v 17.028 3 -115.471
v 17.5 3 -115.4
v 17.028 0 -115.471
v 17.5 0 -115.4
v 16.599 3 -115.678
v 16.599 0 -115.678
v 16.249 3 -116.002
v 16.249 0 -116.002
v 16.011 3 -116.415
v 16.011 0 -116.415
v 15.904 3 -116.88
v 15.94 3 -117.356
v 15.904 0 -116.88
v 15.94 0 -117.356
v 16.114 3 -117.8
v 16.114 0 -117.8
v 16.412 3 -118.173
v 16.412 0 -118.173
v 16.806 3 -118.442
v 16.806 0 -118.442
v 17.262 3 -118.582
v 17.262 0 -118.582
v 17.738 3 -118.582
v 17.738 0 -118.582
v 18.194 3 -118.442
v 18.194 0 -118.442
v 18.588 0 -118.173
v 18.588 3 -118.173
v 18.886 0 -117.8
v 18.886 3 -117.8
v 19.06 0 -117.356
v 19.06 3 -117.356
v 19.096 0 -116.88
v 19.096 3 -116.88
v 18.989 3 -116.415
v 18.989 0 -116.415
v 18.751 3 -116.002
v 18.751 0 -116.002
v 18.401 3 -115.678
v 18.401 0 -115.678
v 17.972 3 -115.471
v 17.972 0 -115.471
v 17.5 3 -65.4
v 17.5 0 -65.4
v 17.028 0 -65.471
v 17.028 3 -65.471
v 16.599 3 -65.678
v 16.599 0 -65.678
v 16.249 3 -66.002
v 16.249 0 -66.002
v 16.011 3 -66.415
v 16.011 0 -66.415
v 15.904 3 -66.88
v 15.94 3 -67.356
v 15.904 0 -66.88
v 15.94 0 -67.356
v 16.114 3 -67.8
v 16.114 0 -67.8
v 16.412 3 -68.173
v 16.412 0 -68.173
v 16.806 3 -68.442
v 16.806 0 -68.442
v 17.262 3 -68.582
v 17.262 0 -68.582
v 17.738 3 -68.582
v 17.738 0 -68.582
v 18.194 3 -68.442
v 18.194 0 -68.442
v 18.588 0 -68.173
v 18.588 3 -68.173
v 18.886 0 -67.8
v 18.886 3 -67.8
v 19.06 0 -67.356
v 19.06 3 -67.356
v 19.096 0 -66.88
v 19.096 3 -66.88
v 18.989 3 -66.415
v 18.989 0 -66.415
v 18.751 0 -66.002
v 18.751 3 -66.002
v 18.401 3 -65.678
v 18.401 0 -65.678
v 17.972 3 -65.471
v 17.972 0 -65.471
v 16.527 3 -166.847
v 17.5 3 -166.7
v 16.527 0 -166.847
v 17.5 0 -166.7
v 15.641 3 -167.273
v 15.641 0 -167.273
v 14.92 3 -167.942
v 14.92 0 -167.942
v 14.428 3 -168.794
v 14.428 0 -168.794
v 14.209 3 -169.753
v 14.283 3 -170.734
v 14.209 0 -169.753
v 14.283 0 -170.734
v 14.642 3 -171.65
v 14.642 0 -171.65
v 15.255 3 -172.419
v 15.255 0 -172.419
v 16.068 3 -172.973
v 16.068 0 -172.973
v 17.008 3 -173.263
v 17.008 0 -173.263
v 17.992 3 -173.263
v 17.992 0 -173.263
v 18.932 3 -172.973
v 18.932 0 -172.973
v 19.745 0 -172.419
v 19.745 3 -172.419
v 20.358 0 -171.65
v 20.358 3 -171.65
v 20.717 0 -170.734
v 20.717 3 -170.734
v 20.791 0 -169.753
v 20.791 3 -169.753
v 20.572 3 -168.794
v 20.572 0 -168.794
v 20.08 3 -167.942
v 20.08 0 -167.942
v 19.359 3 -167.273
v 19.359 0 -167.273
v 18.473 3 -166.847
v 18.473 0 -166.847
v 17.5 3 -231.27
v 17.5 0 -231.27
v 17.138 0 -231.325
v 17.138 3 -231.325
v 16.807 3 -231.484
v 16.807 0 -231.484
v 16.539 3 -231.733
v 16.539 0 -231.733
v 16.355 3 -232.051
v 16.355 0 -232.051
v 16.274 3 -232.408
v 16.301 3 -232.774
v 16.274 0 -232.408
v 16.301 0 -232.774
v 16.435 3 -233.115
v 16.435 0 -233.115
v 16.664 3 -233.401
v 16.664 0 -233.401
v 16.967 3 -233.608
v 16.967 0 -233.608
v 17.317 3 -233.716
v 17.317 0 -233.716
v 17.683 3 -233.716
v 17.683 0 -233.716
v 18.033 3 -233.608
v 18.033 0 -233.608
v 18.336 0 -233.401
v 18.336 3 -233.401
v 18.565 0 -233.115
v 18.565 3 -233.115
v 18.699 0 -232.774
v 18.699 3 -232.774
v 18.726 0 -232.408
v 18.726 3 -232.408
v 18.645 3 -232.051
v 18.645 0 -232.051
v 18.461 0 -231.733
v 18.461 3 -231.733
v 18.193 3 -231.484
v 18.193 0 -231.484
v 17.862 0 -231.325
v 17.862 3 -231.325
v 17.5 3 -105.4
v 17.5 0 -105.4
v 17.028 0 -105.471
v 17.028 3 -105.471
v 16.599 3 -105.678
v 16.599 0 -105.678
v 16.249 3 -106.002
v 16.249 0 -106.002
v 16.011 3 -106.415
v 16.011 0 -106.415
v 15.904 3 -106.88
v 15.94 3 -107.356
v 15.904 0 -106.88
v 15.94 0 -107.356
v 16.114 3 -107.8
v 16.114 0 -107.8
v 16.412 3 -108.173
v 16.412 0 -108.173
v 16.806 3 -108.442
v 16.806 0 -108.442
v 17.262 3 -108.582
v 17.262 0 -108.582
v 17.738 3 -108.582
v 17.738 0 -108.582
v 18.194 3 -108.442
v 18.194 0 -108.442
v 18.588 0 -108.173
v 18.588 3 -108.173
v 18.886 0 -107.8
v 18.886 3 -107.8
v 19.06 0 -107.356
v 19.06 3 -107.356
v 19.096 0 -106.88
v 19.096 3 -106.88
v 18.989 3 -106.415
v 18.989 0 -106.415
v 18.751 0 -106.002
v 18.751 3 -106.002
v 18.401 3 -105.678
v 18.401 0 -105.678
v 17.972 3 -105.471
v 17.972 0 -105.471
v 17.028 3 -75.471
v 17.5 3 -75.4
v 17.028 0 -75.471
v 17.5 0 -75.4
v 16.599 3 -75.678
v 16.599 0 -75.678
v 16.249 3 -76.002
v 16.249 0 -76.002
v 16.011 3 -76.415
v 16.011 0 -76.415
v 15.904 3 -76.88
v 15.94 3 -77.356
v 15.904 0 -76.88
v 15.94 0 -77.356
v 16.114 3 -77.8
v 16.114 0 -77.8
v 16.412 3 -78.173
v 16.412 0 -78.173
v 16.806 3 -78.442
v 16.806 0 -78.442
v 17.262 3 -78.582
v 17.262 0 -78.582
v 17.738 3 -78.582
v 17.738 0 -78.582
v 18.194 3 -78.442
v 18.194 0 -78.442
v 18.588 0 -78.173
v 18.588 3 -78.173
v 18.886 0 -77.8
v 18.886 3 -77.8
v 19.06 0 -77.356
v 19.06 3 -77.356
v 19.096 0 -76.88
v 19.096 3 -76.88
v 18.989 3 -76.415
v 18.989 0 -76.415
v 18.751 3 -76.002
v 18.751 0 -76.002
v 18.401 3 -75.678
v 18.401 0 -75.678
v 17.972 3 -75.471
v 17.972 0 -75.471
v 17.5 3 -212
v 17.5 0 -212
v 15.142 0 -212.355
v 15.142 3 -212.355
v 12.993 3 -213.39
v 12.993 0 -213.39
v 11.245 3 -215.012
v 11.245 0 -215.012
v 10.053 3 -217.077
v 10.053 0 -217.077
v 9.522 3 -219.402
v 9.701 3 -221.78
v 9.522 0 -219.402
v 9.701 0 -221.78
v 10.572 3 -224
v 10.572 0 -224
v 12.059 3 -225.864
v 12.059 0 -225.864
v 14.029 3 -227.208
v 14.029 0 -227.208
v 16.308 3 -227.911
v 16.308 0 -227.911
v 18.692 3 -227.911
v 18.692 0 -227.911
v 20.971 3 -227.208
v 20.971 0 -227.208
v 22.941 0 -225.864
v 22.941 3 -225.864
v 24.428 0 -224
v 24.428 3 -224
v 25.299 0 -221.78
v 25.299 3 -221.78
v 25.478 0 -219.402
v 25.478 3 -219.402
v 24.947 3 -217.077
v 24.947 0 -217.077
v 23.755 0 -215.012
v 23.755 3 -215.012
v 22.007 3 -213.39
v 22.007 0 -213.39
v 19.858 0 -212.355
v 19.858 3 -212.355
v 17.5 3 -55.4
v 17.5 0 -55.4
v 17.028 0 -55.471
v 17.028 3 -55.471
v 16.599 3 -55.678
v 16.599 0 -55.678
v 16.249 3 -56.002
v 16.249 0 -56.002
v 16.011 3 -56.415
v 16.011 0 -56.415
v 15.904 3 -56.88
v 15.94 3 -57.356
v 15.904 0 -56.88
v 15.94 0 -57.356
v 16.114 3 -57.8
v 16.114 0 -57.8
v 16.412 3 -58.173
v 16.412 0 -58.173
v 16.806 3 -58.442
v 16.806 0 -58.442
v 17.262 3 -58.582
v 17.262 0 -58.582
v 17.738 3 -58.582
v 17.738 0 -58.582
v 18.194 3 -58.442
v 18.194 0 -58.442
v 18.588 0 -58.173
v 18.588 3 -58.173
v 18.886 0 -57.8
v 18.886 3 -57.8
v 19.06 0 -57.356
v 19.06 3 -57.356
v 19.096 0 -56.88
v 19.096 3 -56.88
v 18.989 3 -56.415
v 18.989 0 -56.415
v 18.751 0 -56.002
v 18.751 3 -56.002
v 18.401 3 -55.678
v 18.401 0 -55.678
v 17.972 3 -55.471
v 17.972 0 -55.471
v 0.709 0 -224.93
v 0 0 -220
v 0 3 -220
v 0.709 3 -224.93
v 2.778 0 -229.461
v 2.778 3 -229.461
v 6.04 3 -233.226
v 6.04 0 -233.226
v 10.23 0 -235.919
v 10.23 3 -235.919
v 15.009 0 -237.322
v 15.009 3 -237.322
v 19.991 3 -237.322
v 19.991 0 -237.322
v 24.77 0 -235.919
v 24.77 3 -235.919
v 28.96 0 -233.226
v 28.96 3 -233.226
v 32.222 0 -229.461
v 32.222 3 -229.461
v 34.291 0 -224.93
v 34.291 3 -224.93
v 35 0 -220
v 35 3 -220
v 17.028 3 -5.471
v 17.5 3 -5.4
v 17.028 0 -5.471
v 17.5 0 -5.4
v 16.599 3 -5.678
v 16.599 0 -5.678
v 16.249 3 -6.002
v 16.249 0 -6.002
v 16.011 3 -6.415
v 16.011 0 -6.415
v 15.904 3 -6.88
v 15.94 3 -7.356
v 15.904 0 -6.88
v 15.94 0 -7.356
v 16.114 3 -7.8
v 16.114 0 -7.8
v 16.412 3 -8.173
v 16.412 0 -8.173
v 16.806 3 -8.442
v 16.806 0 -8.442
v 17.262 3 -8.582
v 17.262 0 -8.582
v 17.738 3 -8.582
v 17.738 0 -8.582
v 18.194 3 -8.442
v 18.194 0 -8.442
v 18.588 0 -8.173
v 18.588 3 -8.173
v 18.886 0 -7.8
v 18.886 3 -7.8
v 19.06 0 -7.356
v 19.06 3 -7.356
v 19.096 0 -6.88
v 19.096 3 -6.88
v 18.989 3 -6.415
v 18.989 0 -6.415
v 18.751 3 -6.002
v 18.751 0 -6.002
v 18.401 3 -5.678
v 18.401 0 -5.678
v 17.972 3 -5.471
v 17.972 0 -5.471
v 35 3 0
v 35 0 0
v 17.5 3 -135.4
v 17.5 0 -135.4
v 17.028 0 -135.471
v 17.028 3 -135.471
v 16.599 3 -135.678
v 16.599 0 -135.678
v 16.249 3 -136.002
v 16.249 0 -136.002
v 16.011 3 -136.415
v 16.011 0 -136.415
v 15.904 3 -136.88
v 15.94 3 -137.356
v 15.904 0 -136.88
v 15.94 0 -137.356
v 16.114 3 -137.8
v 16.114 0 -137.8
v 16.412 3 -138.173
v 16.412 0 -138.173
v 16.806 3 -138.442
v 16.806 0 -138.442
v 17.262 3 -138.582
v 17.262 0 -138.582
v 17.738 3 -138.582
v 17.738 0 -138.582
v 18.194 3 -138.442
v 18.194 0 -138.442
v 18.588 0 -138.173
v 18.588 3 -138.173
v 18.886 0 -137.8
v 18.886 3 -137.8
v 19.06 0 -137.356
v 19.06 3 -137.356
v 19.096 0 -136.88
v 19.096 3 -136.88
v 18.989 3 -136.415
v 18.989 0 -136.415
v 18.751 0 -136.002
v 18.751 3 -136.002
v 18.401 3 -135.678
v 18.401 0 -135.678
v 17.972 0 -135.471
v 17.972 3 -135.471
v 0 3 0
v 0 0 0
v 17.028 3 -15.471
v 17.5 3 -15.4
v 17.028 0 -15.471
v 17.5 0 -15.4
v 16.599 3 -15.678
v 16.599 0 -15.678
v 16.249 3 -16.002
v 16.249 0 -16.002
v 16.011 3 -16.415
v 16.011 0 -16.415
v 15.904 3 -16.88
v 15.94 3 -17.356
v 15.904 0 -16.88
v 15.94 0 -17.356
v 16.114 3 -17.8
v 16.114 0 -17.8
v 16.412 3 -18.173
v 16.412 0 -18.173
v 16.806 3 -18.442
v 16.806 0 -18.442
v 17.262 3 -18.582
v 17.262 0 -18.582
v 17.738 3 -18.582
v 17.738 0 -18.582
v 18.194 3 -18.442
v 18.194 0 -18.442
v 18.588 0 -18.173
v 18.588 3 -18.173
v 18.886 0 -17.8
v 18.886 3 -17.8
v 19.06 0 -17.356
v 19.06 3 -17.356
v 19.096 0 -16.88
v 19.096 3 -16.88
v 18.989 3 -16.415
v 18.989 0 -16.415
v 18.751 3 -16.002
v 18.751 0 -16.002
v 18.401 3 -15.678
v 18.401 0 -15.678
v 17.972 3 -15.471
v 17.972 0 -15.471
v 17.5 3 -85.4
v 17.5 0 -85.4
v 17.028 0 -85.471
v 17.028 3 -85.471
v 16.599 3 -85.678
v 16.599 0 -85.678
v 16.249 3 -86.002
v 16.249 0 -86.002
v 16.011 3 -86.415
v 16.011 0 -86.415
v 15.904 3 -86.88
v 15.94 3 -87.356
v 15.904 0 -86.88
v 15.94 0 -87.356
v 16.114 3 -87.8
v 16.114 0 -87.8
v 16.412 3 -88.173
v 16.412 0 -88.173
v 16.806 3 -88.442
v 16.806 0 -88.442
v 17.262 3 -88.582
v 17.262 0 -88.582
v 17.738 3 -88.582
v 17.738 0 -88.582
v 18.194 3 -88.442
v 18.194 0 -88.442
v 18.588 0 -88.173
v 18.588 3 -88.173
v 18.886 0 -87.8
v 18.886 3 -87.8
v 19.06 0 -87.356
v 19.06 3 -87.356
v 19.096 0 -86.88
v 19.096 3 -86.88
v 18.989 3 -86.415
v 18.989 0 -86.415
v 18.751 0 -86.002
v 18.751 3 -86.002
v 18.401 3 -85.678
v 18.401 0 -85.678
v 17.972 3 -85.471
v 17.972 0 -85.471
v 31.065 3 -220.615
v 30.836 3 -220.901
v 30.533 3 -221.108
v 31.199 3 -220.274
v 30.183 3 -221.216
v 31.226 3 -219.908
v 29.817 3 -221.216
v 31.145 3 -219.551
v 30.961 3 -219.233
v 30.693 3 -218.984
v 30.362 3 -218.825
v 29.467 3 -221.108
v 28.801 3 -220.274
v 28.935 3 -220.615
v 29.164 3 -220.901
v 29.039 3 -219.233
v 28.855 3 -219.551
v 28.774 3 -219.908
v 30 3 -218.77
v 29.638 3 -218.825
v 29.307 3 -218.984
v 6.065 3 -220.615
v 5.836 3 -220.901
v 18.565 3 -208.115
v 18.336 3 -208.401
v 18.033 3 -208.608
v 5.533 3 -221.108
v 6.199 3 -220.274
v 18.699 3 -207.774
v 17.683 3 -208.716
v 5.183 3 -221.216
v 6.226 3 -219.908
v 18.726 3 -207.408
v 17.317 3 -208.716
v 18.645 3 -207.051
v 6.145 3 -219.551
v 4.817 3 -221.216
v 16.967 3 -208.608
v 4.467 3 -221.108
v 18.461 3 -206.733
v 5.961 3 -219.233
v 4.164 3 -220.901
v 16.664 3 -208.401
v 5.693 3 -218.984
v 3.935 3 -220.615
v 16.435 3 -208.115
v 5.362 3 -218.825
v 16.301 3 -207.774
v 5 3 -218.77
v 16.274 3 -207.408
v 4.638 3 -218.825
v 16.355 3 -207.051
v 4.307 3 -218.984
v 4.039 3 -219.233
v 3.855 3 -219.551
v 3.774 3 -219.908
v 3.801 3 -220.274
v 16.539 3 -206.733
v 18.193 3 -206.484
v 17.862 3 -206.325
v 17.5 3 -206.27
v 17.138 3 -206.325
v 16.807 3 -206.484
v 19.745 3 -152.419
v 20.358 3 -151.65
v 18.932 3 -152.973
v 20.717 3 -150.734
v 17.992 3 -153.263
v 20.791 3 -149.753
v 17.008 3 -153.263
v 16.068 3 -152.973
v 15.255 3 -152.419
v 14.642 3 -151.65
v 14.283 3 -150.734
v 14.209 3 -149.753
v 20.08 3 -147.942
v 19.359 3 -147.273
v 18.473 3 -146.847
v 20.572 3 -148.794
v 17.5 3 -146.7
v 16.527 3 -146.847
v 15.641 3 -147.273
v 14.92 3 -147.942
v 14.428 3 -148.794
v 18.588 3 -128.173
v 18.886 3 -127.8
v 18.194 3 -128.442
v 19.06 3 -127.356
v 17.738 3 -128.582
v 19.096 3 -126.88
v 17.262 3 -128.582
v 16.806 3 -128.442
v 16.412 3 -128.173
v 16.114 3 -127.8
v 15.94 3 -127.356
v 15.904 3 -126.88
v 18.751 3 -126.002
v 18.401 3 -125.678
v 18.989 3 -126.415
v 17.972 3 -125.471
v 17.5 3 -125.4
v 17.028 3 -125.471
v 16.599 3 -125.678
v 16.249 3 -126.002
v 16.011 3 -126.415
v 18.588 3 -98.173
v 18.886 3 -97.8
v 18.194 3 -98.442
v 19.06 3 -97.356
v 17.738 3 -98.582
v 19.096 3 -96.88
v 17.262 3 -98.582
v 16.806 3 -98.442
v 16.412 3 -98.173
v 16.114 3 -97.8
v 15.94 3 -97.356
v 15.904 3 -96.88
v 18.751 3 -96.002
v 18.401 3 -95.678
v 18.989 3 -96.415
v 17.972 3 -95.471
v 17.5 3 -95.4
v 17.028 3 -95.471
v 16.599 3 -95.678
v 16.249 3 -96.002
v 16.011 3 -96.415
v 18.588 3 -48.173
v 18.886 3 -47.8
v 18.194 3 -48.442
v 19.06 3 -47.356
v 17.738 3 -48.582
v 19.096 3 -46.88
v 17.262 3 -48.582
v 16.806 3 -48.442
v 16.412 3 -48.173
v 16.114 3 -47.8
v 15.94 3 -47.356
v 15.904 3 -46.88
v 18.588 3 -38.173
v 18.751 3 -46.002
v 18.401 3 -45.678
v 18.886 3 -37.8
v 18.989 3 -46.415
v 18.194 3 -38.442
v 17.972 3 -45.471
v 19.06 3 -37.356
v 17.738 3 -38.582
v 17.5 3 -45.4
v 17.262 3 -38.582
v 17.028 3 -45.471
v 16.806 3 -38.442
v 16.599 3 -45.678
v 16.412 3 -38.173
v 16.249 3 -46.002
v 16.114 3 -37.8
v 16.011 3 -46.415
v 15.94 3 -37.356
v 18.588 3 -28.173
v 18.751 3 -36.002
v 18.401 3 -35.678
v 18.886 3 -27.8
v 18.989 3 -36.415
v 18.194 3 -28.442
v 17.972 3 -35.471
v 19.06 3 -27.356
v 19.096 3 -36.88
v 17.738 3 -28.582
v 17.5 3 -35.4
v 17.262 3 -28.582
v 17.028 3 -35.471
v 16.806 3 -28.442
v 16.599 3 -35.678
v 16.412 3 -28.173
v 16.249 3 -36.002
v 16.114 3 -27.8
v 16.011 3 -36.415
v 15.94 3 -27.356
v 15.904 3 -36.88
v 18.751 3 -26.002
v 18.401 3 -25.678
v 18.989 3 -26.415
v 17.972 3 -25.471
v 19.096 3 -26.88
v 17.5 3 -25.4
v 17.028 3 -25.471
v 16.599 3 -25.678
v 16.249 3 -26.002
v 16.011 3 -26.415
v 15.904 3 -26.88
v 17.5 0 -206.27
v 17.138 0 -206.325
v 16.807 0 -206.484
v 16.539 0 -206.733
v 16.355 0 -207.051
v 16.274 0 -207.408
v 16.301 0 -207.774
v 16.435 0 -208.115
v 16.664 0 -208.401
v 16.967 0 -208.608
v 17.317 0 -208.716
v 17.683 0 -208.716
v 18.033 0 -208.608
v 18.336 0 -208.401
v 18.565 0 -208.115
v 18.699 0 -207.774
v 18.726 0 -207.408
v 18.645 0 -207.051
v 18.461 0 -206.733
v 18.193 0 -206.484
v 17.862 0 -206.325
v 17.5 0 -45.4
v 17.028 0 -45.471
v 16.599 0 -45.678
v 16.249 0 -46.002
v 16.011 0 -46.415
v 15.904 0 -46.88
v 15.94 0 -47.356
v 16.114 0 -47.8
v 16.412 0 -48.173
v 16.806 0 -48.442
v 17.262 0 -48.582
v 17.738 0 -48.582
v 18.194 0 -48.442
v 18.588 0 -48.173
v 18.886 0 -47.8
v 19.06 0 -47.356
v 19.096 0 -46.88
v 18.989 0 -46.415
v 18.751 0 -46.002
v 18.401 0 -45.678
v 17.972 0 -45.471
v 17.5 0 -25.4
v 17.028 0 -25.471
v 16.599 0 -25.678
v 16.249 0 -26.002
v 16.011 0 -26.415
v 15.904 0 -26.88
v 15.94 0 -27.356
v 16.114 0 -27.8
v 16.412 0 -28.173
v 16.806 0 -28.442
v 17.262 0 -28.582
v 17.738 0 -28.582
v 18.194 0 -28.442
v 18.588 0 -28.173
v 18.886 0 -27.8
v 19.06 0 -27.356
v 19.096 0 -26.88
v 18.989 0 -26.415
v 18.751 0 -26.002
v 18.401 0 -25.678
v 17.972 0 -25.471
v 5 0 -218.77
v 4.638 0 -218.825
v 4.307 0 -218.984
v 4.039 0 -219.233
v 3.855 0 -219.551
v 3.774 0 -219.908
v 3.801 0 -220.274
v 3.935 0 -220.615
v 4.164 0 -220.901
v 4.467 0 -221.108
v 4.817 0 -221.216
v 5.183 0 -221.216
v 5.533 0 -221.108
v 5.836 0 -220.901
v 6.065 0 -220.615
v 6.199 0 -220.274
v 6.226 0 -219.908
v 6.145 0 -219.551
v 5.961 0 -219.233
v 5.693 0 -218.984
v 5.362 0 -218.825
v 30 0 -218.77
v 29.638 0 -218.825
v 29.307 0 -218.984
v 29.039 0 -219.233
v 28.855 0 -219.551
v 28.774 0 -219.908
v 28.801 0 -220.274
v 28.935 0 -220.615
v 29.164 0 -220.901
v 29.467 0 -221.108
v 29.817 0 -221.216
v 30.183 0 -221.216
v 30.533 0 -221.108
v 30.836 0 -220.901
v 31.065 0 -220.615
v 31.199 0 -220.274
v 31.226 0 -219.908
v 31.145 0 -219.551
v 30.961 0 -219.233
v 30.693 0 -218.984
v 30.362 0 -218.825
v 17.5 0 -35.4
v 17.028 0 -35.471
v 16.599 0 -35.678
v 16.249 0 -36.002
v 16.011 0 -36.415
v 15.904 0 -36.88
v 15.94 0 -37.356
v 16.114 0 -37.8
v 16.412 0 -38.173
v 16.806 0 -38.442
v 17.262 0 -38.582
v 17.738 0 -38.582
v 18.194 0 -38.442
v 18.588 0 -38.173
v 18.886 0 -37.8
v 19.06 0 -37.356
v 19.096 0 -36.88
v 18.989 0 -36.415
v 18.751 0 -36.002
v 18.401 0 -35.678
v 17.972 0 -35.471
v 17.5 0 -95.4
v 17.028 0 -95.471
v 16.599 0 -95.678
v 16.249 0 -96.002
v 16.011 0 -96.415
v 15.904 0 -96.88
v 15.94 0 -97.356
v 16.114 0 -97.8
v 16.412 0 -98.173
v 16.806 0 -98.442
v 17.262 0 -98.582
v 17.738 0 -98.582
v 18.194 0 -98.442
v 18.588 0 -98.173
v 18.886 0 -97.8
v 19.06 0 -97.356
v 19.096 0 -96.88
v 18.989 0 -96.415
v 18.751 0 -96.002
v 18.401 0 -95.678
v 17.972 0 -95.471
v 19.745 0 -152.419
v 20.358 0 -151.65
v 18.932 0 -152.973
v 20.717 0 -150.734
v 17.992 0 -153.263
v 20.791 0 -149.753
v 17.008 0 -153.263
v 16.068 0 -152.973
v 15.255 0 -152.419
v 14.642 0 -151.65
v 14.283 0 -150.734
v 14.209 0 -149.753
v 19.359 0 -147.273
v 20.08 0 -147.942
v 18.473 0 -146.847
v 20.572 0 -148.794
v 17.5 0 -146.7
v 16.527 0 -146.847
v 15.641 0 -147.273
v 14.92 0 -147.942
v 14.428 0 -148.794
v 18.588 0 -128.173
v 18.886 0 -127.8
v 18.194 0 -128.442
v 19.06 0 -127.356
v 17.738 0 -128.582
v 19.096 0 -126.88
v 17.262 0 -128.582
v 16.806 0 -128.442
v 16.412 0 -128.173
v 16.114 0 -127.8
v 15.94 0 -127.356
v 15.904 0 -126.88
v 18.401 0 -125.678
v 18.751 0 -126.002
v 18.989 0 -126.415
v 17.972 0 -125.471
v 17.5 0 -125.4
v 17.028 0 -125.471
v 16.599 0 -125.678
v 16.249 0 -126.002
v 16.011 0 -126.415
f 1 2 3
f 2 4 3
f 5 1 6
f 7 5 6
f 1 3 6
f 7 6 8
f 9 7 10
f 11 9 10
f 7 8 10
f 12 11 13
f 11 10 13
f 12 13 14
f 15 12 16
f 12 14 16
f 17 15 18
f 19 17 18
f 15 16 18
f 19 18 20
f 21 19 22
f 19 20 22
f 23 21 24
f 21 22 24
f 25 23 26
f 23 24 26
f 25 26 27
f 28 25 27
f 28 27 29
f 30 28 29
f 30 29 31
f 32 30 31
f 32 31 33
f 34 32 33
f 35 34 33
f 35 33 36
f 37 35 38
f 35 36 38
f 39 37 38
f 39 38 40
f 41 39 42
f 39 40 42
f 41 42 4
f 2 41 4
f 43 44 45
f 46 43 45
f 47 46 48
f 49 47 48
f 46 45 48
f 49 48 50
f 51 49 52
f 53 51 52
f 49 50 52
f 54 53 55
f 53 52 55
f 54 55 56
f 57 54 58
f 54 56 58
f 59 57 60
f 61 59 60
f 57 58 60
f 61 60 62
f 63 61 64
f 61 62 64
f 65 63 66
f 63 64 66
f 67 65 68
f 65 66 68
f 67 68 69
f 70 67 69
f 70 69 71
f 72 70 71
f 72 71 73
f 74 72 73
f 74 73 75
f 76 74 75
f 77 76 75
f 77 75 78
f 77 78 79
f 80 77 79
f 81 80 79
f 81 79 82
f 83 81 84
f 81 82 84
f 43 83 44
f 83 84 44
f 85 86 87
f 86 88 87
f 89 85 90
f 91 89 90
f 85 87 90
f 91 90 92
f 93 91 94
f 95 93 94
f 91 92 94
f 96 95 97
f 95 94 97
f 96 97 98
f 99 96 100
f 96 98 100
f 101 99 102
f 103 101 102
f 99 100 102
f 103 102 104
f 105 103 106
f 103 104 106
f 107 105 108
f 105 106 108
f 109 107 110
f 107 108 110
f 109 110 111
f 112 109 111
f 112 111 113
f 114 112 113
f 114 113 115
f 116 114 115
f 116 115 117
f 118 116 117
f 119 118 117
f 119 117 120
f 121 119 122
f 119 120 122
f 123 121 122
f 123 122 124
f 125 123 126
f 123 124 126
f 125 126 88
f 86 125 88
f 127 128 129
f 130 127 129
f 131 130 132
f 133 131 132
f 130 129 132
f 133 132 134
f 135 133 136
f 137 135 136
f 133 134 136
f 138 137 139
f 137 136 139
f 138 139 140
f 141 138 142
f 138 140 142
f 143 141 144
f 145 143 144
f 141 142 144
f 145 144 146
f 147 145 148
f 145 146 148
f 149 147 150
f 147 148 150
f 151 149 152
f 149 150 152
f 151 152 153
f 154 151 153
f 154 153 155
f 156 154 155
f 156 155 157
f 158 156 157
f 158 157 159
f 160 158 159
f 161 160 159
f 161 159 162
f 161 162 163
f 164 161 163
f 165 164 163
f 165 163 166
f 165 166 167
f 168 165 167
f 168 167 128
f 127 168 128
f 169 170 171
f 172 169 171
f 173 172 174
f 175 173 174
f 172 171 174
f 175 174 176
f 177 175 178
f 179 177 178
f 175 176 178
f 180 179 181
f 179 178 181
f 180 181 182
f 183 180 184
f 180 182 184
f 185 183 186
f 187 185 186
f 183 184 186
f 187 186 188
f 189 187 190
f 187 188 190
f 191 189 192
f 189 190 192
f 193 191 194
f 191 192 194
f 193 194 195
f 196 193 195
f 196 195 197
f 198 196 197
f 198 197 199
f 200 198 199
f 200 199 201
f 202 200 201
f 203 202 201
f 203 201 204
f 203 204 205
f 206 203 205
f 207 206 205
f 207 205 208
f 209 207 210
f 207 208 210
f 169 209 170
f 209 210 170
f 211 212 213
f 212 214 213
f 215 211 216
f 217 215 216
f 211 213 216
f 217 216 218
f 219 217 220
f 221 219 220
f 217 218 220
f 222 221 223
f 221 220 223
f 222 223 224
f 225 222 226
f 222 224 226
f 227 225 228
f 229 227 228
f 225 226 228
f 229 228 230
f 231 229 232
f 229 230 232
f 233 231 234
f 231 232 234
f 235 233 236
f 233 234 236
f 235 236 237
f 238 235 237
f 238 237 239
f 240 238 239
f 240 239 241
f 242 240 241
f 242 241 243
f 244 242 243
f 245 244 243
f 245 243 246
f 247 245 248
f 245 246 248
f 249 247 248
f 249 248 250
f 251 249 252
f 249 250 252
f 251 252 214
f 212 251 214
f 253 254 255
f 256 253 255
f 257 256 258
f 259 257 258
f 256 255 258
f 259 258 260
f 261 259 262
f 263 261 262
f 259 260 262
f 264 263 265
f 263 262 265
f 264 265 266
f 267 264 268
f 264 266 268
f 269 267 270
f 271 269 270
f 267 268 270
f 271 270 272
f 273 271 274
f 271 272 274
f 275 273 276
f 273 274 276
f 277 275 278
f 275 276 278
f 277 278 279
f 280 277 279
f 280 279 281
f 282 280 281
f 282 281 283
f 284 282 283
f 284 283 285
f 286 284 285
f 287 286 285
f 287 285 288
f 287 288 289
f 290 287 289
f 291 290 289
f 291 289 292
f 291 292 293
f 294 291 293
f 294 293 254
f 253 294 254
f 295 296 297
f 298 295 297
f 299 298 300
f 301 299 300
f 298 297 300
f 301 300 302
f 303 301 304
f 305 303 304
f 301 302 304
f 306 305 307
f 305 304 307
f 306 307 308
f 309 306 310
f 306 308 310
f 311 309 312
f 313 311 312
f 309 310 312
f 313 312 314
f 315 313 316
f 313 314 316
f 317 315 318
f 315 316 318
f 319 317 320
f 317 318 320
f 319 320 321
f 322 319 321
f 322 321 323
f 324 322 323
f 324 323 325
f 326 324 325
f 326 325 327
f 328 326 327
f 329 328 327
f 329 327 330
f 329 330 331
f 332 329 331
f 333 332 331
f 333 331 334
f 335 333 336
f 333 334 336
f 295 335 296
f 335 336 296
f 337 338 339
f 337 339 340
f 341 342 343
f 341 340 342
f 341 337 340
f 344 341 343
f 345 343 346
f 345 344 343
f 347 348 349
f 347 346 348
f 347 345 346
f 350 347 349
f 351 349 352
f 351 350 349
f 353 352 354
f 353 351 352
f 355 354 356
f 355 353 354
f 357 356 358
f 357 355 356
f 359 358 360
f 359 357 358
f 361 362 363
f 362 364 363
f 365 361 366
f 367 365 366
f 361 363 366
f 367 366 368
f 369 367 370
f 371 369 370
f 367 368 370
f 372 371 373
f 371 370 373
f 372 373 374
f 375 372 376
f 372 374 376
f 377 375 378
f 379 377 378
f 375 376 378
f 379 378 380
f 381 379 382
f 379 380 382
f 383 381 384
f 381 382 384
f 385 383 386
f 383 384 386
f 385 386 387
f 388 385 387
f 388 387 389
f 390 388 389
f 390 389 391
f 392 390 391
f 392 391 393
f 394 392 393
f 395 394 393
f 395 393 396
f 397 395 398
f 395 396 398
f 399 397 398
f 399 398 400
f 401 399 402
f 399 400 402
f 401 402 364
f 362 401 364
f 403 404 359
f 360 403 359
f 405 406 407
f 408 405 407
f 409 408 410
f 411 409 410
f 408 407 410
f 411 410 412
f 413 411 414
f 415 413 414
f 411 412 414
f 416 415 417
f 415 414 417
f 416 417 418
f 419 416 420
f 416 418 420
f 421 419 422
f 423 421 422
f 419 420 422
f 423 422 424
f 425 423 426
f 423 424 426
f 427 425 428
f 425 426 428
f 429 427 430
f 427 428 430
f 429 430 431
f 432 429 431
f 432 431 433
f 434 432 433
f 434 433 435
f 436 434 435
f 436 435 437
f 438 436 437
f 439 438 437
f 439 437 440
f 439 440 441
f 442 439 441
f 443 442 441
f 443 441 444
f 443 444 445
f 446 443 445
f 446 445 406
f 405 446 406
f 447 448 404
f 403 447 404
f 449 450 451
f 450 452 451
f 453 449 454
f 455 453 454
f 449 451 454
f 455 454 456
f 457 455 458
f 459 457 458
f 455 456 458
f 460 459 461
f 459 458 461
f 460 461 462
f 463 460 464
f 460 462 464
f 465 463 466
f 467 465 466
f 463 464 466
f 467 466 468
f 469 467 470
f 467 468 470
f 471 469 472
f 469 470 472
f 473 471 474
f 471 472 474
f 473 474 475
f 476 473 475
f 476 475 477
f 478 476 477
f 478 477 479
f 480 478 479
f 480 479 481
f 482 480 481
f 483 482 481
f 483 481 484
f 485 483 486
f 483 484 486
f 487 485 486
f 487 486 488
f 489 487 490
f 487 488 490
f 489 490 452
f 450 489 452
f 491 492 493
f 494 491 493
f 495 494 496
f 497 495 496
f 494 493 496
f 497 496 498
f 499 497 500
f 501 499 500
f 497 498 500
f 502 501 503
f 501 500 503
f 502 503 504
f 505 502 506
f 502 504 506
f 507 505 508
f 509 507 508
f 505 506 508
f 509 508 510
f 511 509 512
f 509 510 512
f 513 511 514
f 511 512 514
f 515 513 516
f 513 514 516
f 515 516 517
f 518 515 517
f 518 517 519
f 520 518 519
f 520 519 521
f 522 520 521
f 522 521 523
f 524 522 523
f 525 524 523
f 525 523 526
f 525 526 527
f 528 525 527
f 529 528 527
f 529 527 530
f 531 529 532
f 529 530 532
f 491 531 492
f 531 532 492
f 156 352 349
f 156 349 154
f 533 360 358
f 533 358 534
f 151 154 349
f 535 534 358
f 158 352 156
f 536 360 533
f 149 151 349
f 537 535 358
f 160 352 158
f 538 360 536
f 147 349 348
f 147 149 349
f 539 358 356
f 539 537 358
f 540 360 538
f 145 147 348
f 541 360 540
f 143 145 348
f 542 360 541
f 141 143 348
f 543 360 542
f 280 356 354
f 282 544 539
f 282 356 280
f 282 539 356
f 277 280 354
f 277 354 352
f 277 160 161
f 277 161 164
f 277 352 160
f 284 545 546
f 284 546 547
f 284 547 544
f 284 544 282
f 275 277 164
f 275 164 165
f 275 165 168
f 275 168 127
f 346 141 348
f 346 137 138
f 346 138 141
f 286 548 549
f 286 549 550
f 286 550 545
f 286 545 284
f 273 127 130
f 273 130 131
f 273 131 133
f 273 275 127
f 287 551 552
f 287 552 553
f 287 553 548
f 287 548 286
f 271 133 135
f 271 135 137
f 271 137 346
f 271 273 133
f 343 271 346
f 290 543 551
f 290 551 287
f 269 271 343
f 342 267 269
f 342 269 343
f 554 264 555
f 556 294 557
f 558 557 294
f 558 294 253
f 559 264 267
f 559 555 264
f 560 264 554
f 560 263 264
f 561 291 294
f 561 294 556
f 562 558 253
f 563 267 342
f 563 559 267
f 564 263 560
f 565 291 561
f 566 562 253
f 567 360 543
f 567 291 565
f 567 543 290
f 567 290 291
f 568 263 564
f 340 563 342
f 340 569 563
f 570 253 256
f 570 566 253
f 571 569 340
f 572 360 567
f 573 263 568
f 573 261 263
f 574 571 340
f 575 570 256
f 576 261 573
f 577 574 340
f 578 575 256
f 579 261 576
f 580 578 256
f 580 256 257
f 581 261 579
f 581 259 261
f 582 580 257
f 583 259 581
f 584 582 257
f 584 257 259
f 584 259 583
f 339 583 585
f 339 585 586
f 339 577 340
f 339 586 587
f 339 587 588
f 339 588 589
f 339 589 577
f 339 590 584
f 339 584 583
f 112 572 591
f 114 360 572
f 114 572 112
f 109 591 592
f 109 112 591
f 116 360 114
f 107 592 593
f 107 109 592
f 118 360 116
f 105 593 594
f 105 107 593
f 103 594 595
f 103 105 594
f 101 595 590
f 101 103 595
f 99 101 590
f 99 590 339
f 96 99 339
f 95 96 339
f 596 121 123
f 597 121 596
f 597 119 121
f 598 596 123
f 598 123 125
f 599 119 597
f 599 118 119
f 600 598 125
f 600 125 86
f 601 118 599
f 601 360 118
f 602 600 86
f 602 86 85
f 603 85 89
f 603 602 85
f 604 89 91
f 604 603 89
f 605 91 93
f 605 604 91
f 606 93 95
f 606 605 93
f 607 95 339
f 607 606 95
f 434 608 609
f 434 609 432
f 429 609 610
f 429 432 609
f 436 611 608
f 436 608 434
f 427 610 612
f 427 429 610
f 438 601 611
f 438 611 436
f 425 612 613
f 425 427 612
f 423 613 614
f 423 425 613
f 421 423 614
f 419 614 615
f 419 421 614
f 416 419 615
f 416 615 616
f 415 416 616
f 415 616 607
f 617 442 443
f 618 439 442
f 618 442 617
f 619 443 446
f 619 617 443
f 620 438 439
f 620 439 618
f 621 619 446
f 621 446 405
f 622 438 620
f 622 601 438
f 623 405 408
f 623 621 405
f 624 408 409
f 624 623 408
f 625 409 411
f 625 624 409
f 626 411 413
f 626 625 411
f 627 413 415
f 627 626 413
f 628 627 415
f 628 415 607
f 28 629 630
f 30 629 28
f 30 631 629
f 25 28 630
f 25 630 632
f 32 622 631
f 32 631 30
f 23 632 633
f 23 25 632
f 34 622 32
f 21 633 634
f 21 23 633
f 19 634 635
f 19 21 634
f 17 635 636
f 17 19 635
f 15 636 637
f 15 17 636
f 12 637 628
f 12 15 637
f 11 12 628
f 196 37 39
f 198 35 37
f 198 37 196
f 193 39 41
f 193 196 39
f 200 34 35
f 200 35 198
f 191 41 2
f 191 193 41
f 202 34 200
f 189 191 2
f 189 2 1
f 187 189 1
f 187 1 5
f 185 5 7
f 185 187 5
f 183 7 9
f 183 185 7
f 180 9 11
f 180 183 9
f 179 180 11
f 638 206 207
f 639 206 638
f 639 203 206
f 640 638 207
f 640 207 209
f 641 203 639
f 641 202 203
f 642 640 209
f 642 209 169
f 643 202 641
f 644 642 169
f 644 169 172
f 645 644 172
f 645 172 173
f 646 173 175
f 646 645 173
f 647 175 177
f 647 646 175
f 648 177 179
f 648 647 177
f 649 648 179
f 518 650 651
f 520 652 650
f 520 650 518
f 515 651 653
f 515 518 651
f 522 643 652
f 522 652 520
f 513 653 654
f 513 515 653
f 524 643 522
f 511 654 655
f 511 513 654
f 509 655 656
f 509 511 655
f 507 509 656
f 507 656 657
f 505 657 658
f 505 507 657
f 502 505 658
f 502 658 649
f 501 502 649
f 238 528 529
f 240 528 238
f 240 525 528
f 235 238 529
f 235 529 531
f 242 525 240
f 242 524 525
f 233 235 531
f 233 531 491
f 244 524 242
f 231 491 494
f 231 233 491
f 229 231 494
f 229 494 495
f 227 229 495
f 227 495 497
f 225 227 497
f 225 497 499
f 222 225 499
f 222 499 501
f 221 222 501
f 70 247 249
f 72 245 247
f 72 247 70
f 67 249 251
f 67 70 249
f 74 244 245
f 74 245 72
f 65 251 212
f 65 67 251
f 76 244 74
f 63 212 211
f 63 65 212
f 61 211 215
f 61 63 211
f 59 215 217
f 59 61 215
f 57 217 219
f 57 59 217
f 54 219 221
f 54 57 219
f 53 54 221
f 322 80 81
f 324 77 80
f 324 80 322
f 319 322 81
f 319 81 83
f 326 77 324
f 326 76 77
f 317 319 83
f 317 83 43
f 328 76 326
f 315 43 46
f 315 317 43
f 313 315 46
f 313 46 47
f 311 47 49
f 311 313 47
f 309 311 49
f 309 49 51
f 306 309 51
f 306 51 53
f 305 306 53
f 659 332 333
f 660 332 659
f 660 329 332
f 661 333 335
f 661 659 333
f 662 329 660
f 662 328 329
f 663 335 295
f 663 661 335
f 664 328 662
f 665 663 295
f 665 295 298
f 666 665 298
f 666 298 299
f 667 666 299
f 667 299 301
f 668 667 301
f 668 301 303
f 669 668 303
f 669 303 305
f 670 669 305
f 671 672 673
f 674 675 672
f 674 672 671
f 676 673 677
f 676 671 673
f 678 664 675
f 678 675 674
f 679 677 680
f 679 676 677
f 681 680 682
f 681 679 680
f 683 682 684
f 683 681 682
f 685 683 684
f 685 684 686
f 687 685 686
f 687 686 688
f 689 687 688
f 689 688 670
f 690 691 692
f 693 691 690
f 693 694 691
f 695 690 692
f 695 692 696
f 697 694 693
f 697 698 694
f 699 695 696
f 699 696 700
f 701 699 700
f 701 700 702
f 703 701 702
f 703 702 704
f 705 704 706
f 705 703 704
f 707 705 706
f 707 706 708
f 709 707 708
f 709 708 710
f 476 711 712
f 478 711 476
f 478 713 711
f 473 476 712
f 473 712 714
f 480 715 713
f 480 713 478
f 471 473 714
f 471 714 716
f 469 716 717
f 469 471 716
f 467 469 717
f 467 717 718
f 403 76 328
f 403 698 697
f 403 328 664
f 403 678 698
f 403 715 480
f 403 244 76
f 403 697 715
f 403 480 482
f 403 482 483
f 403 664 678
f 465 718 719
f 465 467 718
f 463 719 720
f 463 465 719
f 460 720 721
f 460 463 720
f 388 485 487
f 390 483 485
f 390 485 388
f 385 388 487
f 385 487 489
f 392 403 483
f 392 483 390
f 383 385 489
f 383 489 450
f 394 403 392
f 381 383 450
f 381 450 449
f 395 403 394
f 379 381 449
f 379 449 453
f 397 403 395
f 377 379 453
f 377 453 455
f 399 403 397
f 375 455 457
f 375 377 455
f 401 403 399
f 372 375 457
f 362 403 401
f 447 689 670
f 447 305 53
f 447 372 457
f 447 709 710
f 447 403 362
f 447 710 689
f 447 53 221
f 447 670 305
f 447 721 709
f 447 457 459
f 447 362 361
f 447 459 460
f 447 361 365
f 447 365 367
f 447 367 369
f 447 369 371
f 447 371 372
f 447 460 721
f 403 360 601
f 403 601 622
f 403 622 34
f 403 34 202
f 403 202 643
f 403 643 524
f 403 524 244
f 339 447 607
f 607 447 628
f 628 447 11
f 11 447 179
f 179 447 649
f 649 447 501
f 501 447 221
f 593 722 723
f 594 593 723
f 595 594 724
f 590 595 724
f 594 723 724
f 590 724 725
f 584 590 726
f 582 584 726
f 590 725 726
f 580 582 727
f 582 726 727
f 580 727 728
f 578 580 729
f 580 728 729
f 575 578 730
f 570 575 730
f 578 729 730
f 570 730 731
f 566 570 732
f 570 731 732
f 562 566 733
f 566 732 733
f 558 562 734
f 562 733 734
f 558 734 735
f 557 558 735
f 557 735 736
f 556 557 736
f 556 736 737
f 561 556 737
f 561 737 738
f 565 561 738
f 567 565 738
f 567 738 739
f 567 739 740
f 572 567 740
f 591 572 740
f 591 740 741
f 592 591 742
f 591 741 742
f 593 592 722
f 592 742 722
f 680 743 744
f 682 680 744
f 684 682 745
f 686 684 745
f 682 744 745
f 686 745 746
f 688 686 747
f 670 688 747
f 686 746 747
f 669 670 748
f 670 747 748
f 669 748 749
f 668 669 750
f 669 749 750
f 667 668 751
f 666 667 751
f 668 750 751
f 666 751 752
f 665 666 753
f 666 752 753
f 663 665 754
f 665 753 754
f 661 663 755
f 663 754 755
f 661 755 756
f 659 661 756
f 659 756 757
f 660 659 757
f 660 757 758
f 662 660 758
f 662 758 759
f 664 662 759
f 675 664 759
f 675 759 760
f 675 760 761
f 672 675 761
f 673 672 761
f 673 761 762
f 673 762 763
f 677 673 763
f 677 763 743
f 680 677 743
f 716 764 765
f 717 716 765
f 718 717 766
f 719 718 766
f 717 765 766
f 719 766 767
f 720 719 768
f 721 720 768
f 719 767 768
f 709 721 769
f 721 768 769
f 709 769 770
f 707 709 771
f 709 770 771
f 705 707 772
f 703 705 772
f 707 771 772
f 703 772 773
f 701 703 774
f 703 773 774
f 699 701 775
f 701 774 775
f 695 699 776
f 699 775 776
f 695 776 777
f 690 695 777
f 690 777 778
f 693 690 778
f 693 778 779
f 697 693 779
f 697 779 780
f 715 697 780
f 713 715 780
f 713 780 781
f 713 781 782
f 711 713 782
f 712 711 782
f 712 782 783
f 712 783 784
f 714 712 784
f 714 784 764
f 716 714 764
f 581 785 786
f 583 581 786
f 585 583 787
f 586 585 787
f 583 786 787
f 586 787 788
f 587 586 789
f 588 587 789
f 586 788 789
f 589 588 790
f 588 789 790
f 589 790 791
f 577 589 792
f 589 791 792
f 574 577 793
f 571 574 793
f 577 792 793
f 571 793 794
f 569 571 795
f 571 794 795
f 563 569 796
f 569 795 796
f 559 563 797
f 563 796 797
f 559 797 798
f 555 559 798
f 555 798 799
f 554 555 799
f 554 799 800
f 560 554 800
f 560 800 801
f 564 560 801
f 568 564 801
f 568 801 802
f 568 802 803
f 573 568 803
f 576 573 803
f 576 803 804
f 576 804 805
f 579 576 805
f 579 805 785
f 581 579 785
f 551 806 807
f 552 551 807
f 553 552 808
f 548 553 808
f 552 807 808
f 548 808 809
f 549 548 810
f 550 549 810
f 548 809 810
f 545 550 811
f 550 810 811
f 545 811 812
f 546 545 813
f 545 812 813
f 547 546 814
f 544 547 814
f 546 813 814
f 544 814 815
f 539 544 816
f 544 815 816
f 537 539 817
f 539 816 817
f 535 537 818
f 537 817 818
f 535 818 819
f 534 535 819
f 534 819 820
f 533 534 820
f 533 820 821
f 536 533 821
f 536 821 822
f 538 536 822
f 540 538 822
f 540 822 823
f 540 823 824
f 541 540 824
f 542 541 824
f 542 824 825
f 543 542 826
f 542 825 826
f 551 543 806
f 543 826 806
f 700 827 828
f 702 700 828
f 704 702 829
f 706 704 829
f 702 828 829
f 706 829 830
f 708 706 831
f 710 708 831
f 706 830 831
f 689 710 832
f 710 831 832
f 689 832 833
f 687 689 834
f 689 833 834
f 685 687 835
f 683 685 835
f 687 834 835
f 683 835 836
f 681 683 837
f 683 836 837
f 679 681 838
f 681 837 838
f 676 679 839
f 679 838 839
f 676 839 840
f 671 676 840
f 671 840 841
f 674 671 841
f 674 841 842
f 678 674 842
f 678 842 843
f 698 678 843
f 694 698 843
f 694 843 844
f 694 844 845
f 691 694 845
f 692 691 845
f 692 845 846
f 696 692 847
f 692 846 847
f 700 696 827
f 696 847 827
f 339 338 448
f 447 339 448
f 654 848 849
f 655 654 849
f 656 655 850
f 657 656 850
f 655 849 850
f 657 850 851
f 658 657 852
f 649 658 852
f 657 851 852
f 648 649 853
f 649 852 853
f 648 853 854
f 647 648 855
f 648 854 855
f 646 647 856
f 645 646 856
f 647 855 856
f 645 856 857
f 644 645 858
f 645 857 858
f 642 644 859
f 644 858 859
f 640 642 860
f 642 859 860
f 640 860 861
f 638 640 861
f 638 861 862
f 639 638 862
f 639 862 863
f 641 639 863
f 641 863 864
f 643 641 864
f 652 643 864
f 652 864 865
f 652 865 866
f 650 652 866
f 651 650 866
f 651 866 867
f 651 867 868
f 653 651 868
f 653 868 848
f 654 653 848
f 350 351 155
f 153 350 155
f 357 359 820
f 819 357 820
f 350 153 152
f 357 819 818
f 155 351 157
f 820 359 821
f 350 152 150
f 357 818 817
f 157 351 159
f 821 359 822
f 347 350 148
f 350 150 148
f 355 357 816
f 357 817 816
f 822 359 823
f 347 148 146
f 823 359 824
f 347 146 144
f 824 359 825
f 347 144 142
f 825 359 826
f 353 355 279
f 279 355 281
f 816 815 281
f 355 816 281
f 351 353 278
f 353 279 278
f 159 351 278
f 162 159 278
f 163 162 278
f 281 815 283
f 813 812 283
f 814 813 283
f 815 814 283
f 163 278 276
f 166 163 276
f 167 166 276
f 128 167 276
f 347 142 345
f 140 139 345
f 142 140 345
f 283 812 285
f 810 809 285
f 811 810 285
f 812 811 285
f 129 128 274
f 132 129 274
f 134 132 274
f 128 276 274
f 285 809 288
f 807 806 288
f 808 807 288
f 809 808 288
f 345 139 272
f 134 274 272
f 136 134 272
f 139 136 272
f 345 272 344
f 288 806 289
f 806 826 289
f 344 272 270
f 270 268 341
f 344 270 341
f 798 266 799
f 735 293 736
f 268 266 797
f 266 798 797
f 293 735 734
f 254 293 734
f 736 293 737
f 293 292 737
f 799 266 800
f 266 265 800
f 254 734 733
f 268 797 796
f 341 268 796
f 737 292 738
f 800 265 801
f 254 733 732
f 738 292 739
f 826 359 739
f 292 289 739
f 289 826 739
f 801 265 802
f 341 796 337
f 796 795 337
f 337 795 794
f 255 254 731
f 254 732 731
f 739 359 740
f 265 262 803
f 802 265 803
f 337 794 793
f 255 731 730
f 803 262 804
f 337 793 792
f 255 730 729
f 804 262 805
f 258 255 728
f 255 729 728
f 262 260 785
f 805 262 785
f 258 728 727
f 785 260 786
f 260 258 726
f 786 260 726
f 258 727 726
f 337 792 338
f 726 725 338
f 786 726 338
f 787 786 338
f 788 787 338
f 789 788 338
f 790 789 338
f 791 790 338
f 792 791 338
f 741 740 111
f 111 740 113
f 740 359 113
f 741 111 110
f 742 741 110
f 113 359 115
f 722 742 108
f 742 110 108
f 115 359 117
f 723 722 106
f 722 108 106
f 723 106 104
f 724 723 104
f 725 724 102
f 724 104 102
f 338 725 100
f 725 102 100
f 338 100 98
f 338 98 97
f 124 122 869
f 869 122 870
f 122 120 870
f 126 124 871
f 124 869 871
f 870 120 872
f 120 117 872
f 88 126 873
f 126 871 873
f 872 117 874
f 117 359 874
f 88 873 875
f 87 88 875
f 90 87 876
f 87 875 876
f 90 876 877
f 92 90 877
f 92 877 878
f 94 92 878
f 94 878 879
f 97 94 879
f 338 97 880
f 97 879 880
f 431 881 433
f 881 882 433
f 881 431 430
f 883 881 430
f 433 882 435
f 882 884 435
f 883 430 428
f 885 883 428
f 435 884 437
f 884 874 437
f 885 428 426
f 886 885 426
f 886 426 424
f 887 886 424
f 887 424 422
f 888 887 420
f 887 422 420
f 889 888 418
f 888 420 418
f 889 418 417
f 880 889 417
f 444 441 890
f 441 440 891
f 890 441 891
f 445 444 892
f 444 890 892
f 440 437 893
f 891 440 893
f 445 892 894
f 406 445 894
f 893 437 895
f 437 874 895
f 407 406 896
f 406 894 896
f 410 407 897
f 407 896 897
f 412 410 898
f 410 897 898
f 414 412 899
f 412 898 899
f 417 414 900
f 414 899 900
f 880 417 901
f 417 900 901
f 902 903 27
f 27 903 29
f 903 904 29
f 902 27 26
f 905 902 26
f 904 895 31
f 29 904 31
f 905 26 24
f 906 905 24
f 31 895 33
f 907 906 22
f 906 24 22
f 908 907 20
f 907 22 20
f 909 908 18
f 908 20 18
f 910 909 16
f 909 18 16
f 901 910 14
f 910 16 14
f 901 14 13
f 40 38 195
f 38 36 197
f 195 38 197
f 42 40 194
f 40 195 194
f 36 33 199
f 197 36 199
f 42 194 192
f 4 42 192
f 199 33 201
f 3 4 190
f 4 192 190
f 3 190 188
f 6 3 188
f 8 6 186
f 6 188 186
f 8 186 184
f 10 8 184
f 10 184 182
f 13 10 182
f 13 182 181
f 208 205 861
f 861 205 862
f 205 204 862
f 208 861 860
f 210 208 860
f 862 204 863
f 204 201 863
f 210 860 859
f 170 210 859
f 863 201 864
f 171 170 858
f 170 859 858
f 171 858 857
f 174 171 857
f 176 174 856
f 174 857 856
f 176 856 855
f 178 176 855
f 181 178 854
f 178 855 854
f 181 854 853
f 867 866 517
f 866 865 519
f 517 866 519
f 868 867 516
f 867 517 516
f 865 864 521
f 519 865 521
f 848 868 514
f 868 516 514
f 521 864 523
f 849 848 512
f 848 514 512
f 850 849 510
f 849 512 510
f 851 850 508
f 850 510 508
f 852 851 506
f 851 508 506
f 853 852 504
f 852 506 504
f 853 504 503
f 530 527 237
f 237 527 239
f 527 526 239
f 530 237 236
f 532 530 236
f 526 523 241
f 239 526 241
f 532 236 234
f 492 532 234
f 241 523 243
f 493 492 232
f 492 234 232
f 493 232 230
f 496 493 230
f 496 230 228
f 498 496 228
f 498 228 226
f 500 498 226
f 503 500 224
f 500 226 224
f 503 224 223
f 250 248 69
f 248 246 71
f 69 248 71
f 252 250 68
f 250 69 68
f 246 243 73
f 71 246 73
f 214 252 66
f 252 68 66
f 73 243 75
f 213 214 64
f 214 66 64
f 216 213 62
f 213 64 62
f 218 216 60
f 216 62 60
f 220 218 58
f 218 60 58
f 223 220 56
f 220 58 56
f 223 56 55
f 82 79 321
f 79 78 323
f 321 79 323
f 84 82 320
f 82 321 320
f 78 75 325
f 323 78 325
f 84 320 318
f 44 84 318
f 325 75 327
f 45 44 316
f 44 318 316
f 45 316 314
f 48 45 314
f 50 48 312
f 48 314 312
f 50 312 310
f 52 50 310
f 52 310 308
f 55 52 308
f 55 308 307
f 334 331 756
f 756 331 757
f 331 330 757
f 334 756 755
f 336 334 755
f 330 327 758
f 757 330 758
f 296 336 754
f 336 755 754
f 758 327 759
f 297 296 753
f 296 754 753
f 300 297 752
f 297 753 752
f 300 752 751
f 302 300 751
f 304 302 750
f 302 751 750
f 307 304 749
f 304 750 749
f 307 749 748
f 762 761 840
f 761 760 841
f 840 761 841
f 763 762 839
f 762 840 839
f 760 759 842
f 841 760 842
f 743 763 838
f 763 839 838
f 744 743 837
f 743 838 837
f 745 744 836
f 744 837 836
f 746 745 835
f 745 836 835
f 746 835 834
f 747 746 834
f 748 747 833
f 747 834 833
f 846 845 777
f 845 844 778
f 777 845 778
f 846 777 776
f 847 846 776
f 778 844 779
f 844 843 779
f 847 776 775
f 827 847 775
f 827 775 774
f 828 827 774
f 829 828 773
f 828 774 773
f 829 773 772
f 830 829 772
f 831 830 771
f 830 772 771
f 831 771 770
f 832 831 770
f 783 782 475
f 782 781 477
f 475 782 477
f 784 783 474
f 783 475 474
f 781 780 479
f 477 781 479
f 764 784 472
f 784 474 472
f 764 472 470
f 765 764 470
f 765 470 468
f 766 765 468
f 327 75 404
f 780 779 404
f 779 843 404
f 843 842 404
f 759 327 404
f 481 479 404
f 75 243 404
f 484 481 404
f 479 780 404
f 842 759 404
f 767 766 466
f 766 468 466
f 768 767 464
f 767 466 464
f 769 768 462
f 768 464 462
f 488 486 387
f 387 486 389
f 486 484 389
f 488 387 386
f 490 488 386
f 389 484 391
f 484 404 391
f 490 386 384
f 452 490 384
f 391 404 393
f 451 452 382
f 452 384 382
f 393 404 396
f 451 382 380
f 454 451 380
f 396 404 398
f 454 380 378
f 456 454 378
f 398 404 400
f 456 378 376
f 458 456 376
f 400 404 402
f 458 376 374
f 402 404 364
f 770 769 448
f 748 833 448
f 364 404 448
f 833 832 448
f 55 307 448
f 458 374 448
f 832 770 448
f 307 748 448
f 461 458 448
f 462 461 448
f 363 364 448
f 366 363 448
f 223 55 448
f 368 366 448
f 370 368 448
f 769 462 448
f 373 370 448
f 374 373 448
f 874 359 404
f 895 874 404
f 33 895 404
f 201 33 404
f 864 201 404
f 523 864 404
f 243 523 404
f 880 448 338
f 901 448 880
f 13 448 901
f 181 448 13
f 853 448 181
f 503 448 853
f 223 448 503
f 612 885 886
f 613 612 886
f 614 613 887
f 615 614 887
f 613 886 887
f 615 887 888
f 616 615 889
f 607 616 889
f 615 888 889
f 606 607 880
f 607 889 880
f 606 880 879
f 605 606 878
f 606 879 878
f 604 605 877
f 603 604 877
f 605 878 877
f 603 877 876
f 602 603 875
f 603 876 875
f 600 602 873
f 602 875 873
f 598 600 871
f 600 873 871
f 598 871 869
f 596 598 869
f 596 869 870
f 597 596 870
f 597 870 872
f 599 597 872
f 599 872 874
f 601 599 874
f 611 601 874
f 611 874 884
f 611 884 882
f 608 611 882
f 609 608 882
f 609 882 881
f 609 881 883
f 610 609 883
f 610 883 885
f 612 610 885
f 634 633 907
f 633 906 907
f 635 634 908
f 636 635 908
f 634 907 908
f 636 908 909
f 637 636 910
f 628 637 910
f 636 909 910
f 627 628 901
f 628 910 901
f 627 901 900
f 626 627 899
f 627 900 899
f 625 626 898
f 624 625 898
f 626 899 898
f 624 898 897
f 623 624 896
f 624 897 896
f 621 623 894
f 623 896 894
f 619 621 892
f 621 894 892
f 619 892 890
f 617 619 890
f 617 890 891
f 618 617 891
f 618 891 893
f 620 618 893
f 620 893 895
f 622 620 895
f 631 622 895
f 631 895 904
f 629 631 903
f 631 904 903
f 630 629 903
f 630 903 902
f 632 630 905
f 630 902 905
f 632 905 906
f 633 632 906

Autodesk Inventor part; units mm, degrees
ref_plane "YZ Plane" through (0, 0, 0) normal (1, 0, 0) x (0, 1, 0)
ref_plane "XZ Plane" through (0, 0, 0) normal (0, 1, 0) x (-1, 0, 0)
ref_plane "XY Plane" through (0, 0, 0) normal (0, 0, 1) x (1, 0, 0)
sketch "スケッチ1" plane through (0, 0, 0) normal (0, 1, 0) x (-1, 0, 0)
  line L0 (0, 0) -> (-35, 0)
  line L1 (-35, 0) -> (-35, -220)
  line L2 (-35, -220) -> (0, -220)
  line L3 (0, -220) -> (0, 0)
  arc A0 (-35, -220) -> (0, -220) centre (-17.5, -220) ccw
  dimension "d0" = 35
  dimension "d1" = 220
  dimension "d2" = 17.5
extrude "押し出し1" add sketch "スケッチ1" along normal blind 3
sketch "スケッチ2" plane through (0, 3, 0) normal (0, 1, 0) x (1, 0, 0)
  line L0 (0, 0) -> (35, 0) construction
  line L1 (17.5, 0) -> (17.5, 237.5) construction
  arc A0 (35, 220) -> (0, 220) centre (17.5, 220) ccw construction
hole "穴1" at (17.5, 3, -220) direction (0, -1, 0) diameter 16 end through all
sketch "スケッチ3" plane through (0, 3, 0) normal (0, 1, 0) x (1, 0, 0)
  circle A0 centre (17.5, 220) radius 8 projected
  circle A1 centre (17.5, 220) radius 12.5
  point P0 (0, 0)
  point P1 (5, 220)
  point P2 (30, 220)
  point P3 (17.5, 232.5)
  point P4 (17.5, 207.5)
  dimension "d12" = 25
hole "穴2" at (5, 3, -220) at (30, 3, -220) at (17.5, 3, -232.5) at (17.5, 3, -207.5) direction (0, -1, 0) diameter 2.459 end through all thread size "M3x0.5" class "6H" standard "ISO Metric profile"
sketch "スケッチ4" plane through (0, 3, 0) normal (0, 1, 0) x (1, 0, 0)
  line L0 (0, 0) -> (35, 0) construction
  line L1 (17.5, 0) -> (17.5, 237.5) construction
  arc A0 (35, 220) -> (0, 220) centre (17.5, 220) ccw construction
  circle A1 centre (17.5, 220) radius 8 projected
  point P0 (17.5, 137)
  point P1 (17.5, 127)
  point P2 (17.5, 117)
  point P3 (17.5, 107)
  point P4 (17.5, 97)
  point P5 (17.5, 87)
  point P6 (17.5, 77)
  point P7 (17.5, 67)
  point P8 (17.5, 57)
  point P9 (17.5, 47)
  point P10 (17.5, 37)
  point P11 (17.5, 27)
  point P12 (17.5, 17)
  point P13 (17.5, 7)
  dimension "d42" = 83
  dimension "d45" = 10
hole "穴3" at (17.5, 3, -137) at (17.5, 3, -127) at (17.5, 3, -117) at (17.5, 3, -107) at (17.5, 3, -97) at (17.5, 3, -87) at (17.5, 3, -77) at (17.5, 3, -67) at (17.5, 3, -57) at (17.5, 3, -47) at (17.5, 3, -37) at (17.5, 3, -27) at (17.5, 3, -17) at (17.5, 3, -7) direction (0, -1, 0) diameter 3.2 end through all
sketch "スケッチ5" plane through (0, 3, 0) normal (0, 1, 0) x (1, 0, 0)
  line L0 (0, 0) -> (35, 0) construction
  line L1 (17.5, 0) -> (17.5, 237.5) construction
  arc A0 (35, 220) -> (0, 220) centre (17.5, 220) ccw construction
  circle A1 centre (17.5, 137) radius 1.6 construction
  point P0 (17.5, 150)
  point P1 (17.5, 170)
  dimension "d50" = 13
  dimension "d51" = 20
hole "穴4" at (17.5, 3, -150) at (17.5, 3, -170) direction (0, -1, 0) diameter 6.6 end through all
properties part number "shoulder2_upper_plate_left" material "アルミニウム 5052"
